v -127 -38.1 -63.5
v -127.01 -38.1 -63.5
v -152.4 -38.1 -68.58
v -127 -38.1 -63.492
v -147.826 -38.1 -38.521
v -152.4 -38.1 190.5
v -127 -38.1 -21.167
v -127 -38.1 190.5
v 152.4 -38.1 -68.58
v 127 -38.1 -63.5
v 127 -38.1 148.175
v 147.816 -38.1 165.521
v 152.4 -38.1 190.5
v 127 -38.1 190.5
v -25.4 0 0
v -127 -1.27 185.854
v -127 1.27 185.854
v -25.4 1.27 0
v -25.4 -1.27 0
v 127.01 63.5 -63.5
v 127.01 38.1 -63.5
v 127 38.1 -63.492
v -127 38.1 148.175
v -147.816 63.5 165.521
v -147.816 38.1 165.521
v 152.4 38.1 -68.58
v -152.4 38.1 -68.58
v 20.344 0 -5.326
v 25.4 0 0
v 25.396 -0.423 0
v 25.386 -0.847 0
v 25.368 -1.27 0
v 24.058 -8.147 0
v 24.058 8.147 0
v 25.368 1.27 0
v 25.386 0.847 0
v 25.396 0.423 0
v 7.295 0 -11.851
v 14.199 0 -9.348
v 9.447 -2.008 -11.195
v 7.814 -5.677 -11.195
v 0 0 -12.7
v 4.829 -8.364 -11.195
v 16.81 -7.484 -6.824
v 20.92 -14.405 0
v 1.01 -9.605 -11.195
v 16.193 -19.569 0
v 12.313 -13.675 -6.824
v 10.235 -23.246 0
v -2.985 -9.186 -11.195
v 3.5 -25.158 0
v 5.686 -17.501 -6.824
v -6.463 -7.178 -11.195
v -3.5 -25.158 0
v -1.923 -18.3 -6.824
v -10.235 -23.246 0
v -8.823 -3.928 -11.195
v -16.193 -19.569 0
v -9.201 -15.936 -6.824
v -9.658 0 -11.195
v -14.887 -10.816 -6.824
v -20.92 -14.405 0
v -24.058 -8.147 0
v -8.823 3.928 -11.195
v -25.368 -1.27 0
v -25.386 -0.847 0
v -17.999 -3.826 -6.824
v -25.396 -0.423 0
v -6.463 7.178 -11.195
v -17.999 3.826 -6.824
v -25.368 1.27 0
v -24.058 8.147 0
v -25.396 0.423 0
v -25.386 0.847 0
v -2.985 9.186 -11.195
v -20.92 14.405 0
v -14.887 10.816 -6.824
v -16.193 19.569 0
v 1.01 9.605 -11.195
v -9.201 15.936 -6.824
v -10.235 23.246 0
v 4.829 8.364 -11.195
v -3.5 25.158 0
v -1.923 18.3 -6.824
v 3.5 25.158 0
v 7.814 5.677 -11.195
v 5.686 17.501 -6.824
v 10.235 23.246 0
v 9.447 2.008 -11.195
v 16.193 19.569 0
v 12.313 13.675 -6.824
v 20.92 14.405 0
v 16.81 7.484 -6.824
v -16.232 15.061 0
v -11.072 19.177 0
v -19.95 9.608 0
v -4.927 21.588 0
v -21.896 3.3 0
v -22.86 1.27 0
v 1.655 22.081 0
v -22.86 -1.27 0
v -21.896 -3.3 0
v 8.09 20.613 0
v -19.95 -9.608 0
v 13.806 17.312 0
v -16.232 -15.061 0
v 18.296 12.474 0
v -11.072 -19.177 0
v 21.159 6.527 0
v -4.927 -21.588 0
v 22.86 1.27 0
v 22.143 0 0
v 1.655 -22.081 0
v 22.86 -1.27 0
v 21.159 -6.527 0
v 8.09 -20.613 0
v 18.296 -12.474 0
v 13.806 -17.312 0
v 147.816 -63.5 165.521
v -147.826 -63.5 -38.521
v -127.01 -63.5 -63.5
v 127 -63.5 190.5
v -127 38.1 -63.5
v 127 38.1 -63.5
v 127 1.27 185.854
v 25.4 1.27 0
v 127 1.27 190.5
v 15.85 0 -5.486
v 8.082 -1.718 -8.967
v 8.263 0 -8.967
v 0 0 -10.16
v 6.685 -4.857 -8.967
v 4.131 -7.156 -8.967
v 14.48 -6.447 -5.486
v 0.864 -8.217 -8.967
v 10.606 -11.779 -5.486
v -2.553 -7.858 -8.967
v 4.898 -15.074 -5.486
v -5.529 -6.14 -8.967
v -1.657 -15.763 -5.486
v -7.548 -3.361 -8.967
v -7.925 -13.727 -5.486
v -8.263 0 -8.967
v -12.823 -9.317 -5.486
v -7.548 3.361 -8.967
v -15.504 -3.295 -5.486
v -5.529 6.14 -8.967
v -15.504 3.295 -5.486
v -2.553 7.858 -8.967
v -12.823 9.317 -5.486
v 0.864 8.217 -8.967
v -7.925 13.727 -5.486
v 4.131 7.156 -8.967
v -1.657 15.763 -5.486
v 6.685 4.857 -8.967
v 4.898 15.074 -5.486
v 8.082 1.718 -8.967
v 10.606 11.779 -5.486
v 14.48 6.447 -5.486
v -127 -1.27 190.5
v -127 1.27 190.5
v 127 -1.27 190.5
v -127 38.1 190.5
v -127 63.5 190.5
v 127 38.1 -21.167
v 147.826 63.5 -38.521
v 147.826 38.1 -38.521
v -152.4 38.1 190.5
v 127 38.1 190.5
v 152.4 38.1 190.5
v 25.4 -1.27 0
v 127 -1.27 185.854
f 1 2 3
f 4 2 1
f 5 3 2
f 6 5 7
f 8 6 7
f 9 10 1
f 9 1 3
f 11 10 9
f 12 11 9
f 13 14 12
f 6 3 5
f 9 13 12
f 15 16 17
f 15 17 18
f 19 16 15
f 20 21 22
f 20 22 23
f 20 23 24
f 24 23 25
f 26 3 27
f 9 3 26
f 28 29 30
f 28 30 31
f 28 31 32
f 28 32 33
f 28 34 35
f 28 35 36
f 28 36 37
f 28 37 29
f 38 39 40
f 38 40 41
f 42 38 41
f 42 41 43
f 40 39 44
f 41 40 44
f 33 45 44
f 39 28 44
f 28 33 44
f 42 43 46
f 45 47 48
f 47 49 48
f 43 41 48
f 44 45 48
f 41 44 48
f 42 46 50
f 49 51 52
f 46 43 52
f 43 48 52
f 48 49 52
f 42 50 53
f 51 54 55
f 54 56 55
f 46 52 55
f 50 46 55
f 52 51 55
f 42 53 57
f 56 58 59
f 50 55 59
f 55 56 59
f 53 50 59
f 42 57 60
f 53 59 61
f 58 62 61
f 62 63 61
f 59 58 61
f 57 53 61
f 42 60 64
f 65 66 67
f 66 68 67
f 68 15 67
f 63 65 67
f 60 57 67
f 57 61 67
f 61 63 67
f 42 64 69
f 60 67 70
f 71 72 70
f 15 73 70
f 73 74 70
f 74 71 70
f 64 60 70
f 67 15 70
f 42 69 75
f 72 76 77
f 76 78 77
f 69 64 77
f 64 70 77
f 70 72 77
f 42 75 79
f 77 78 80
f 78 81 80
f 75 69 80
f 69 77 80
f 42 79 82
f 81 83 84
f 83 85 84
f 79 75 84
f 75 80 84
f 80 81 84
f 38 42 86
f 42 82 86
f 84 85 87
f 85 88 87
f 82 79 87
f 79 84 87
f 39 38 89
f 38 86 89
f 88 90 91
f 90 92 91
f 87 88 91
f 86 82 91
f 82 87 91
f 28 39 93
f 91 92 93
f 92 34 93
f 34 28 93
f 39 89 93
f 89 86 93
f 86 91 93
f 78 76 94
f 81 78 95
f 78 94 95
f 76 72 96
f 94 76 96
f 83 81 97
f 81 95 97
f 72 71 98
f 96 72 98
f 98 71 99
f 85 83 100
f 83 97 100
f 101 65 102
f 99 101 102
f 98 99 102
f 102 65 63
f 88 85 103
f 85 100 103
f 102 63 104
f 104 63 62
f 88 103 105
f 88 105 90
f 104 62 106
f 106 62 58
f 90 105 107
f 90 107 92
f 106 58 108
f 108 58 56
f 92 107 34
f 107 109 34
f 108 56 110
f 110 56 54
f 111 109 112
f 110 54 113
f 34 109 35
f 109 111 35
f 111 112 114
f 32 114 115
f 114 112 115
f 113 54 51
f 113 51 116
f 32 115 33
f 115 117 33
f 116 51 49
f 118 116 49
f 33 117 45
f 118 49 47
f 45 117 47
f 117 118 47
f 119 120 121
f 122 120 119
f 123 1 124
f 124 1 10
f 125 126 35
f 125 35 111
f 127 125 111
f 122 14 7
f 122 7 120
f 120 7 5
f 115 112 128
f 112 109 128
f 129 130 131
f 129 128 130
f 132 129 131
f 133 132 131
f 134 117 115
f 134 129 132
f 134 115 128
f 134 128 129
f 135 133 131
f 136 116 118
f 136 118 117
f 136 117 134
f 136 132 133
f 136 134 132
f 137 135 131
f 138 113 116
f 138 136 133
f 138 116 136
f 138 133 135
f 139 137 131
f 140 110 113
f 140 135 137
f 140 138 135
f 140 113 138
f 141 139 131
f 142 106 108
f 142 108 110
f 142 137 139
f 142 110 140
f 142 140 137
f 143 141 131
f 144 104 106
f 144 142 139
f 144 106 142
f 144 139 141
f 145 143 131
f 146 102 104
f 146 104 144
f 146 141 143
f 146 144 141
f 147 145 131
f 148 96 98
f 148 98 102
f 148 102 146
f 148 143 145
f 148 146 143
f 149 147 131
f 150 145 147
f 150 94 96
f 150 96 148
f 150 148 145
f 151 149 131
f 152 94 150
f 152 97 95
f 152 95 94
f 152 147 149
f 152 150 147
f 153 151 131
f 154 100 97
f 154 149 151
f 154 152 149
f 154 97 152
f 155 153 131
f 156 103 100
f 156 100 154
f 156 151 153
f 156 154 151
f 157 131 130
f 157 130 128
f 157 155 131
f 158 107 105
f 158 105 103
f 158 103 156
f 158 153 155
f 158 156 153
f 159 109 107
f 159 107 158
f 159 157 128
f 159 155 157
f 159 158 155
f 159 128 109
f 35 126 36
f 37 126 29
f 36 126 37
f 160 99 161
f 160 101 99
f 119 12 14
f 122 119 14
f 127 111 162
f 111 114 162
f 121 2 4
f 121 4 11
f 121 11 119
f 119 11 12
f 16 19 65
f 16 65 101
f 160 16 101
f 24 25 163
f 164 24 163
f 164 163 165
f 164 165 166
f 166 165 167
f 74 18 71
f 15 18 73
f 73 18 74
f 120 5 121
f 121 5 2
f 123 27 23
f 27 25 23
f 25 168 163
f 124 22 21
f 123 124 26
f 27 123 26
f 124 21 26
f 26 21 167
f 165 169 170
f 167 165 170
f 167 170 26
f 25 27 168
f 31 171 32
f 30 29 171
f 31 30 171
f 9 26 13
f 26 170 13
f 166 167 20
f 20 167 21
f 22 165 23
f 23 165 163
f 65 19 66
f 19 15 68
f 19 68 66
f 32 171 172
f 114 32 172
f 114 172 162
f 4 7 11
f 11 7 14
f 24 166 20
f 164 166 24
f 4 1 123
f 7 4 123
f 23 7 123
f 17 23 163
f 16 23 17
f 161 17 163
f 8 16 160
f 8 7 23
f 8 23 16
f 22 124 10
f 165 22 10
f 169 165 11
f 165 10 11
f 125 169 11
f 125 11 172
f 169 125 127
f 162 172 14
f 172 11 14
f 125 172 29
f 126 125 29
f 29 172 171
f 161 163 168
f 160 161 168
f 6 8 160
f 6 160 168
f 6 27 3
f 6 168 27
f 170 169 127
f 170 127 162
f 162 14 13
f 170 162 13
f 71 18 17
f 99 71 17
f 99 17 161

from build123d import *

# Parameters (mm, degrees)
F2_T      = -2.54
F3_W      = 25.4
F3_H      = 254
F4_DEPTH  = 38.1
F7_DEPTH  = 25.4
F12_DEPTH = 1.27
F14_W     = 304.8
F14_H     = 76.2
F15_DEPTH = 5.08


with BuildPart() as f1:
    # F0 (on Front) → F1 (revolve)
    with BuildSketch(Plane.XZ):
        with BuildLine():
            Line((25.4, 0), (0, 0))
            Line((0, 0), (0, -12.7))
            ThreePointArc((0, -12.7), (14.1990316571, -9.3480633142), (25.4, 0))
        make_face()
    revolve(axis=Axis((0, 0, -6.35), (0, 0, -1)))

    # F2
    f2_openings = [f1.faces().sort_by_distance(p)[0] for p in [
        (0, 0, 0),
    ]]
    offset(amount=F2_T, openings=f2_openings)



with BuildPart() as f4:
    # F3 (on Front) → F4 (new body, symmetric)
    with BuildSketch(Plane.XZ):
        with Locations((139.7, 63.5)):
            Rectangle(F3_W, F3_H)
    extrude(amount=F4_DEPTH, both=True)


with BuildPart() as f5_1:
    # F5: instance of F4
    add(f4.part.mirror(Plane.YZ))


with BuildPart() as f7:
    # F6 (on face) → F7 (new body)
    with BuildSketch(Plane.XZ.offset(38.1)):
        Polygon((147.8155081967, 165.5213901639), (127, 190.5), (-147.8256681967, -38.5213901639), (-127.01016, -63.5), align=None)
    extrude(amount=F7_DEPTH)


with BuildPart() as f8_1:
    # F8: instance of F7
    add(f7.part.mirror(Plane.XZ))


with BuildPart() as f9_1:
    # F9: instance of F8_1
    add(f8_1.part.mirror(Plane.YZ))


with BuildPart() as f12:
    # F11 (on Front) → F12 (new body, symmetric)
    with BuildSketch(Plane.XZ):
        Polygon((-22.86, 0), (-127, 190.5), (-127, 185.8536585366), (-25.4, 0), align=None)
    extrude(amount=F12_DEPTH, both=True)


with BuildPart() as f13_1:
    # F13: instance of F12
    add(f12.part.mirror(Plane.YZ))


with BuildPart() as f1_1:
    add(f1.part)

    add(f4.part)  # F15 merges F4

    add(f5_1.part)  # F15 merges F5_1

    add(f7.part)  # F15 merges F7

    add(f9_1.part)  # F15 merges F9_1

    add(f12.part)  # F15 merges F12

    add(f13_1.part)  # F15 merges F13_1
    # F14 (on face) → F15 (join)
    with BuildSketch(Plane(origin=(0, 0, -63.5), x_dir=(1, 0, 0), z_dir=(0, 0, -1))):
        Rectangle(F14_W, F14_H)
    extrude(amount=F15_DEPTH)


solid = f1_1.part
